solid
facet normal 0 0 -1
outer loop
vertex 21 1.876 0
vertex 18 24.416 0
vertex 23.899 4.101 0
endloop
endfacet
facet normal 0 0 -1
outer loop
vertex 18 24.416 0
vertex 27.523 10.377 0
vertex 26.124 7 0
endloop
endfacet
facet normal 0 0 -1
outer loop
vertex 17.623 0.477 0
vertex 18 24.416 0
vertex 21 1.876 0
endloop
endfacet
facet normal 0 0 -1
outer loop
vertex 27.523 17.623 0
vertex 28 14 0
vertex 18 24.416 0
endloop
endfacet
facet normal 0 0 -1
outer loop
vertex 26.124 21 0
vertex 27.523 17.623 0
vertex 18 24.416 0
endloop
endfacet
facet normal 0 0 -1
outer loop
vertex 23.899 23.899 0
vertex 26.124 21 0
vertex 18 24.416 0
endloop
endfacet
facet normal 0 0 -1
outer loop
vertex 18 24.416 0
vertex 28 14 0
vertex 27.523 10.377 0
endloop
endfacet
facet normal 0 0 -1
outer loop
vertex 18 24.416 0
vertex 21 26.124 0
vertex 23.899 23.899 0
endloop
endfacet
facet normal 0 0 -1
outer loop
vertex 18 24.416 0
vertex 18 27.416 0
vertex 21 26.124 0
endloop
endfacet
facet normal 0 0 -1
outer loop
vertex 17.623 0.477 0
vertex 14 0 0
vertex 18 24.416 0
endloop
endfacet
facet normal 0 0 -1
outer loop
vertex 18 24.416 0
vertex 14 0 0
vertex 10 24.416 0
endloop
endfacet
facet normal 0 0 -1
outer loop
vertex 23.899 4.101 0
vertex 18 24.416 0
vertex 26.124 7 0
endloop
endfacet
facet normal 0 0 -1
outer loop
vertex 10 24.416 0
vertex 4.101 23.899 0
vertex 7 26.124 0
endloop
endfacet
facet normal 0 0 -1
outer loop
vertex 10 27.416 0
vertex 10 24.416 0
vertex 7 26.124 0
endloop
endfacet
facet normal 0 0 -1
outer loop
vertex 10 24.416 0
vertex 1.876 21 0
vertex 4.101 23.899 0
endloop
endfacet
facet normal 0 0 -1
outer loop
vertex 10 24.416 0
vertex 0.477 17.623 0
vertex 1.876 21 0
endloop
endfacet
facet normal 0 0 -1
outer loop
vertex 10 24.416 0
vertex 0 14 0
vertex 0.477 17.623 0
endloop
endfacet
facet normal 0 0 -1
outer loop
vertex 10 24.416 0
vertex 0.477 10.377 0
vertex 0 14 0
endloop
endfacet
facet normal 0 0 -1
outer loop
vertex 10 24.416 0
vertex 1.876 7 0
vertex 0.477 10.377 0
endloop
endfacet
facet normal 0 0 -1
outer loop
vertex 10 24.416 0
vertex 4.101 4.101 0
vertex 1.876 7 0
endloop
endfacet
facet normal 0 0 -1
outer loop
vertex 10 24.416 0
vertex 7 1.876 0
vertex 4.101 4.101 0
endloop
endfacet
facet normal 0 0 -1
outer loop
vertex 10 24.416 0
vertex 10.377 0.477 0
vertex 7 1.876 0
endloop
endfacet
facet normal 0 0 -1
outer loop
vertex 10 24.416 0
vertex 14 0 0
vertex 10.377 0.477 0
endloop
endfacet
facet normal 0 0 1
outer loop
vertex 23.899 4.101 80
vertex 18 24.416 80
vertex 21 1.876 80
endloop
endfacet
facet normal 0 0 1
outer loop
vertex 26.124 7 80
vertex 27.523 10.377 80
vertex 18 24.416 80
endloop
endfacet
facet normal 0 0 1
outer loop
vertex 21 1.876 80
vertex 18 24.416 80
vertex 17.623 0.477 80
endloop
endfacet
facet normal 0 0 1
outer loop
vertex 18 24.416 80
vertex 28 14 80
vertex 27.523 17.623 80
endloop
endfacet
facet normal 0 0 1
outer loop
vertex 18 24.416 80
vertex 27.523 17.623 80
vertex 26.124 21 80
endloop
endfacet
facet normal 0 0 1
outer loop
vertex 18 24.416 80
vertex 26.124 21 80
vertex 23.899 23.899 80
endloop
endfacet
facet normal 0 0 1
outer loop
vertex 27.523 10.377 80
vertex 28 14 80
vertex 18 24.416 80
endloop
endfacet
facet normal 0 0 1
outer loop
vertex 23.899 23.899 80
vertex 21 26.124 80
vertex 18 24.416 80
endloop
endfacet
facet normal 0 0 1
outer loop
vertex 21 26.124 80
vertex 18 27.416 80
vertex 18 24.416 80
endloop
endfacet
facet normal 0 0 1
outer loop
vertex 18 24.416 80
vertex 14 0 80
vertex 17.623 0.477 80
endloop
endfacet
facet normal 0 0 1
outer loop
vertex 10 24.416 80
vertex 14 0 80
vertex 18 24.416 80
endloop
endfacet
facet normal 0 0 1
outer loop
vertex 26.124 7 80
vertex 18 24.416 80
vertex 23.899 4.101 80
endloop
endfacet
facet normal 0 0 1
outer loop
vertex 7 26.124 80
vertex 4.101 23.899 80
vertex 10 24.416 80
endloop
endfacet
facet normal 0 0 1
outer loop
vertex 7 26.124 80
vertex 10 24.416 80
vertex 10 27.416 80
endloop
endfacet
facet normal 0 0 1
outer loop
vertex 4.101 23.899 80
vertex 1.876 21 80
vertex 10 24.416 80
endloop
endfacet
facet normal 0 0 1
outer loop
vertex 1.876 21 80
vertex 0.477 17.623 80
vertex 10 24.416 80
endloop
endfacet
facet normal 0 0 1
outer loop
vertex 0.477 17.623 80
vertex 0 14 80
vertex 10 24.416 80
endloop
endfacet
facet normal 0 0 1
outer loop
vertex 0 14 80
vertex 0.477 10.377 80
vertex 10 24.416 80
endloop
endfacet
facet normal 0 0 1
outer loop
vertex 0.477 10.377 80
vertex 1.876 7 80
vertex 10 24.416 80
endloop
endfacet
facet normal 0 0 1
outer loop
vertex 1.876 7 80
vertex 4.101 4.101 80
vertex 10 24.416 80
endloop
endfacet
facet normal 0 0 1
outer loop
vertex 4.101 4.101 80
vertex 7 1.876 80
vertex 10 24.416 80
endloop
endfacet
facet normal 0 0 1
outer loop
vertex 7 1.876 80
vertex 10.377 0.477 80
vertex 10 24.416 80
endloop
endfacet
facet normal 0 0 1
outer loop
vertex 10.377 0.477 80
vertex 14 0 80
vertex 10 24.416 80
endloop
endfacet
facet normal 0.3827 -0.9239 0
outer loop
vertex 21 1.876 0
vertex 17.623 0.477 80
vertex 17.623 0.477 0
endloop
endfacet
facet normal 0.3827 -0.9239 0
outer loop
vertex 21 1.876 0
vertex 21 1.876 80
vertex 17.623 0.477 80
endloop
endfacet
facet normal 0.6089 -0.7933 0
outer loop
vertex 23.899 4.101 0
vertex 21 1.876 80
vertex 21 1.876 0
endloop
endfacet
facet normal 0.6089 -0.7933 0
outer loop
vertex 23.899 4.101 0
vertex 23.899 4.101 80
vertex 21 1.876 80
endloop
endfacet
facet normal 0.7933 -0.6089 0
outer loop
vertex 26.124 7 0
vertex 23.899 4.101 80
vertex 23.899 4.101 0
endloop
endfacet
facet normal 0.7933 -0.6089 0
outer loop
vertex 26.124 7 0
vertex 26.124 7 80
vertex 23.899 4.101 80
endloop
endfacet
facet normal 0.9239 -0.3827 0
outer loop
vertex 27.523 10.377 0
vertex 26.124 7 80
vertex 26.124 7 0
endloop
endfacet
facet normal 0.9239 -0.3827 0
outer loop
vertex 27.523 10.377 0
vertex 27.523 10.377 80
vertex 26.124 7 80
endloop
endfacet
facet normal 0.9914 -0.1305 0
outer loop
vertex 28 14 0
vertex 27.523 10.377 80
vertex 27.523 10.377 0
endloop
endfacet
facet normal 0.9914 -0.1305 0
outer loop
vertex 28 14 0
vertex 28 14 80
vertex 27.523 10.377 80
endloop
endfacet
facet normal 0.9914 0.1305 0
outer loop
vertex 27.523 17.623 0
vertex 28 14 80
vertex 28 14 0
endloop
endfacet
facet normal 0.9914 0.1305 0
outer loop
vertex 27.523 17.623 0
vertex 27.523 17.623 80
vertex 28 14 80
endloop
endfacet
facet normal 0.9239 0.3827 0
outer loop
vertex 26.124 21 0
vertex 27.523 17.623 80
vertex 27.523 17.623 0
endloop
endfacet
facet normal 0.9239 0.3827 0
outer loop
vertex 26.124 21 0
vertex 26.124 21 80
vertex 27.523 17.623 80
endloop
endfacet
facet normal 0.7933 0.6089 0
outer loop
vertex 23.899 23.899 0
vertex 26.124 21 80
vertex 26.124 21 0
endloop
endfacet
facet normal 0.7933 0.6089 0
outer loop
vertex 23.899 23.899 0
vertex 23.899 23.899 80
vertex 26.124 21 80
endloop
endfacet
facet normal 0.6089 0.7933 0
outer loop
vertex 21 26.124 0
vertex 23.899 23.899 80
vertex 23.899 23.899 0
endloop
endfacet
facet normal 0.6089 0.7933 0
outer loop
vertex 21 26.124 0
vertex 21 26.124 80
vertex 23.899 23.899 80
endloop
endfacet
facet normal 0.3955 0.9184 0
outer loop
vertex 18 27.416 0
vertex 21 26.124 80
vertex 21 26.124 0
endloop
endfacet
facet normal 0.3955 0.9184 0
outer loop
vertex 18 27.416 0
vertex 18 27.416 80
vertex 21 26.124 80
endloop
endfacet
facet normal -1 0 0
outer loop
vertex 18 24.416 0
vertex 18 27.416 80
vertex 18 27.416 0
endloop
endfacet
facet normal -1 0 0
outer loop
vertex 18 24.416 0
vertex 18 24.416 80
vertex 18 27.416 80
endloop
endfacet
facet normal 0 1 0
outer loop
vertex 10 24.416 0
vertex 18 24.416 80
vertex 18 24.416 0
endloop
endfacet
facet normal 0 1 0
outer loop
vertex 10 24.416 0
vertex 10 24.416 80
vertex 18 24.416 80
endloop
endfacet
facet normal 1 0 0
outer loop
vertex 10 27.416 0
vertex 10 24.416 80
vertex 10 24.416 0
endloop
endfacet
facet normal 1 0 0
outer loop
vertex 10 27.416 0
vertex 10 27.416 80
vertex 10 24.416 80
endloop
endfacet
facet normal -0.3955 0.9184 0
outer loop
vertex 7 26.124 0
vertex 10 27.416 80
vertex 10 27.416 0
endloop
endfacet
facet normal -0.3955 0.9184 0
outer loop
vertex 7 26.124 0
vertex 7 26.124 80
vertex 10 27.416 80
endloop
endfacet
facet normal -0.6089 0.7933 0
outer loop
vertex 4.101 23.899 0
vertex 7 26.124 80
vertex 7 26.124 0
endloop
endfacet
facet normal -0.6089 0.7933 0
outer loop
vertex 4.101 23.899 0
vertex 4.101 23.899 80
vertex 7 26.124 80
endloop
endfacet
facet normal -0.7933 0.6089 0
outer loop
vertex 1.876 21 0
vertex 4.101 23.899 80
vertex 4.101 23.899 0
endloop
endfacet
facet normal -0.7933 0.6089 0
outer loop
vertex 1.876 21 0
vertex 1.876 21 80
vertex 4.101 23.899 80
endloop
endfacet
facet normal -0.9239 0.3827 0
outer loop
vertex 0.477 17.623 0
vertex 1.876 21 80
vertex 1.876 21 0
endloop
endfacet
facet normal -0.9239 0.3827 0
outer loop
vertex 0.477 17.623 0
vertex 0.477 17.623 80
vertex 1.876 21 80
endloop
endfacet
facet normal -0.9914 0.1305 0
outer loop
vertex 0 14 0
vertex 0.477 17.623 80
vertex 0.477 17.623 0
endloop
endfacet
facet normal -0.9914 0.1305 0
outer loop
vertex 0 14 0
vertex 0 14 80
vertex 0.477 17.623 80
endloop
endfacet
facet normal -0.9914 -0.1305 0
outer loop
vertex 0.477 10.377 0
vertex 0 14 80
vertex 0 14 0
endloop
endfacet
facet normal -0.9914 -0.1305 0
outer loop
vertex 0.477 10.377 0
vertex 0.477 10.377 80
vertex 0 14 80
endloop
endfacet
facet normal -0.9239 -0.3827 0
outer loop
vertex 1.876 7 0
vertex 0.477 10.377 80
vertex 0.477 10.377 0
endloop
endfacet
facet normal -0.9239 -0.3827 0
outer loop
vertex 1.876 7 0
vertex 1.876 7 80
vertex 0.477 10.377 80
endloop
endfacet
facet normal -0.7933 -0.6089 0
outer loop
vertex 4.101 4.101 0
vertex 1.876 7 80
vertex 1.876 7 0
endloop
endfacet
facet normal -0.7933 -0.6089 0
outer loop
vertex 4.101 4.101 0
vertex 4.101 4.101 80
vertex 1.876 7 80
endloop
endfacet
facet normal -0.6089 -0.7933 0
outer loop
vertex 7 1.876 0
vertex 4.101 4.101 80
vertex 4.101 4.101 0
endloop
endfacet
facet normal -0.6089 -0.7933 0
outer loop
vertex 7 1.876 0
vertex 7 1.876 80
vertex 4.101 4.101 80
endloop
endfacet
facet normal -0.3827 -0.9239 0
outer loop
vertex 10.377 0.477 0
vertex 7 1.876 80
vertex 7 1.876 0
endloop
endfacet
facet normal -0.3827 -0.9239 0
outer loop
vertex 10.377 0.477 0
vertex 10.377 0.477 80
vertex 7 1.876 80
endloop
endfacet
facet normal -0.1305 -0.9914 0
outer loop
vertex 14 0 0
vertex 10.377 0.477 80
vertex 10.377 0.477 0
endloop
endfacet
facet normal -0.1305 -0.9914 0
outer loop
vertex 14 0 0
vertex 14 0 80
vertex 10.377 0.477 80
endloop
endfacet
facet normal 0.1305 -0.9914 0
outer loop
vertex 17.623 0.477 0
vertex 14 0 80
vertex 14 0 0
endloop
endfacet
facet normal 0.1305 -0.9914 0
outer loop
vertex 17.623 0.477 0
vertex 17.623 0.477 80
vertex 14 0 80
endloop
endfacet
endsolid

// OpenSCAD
$fn = 32;

// ----------------------------------------------------------------------
// Keyway shaft: d28 shaft, key 8 x 3 mm
// ----------------------------------------------------------------------

// --- parameters (mm) ---
shaft_r = 14;             // shaft radius
key_w = 8;                // keyway width
key_d = 3;                // keyway depth below the surface line
plate_t = 80;             // shaft length, Z (extrusion height)
fit_tol = 0.02;           // declared fit tolerance (prompt contract)
free_tol = 0.2;           // declared free tolerance (prompt contract)

shaft_d = 2 * shaft_r;  // shaft diameter
circle_step = 15;  // polygon sampling step, degrees

profile = [[7, 26.124], [4.101, 23.899], [1.876, 21], [0.477, 17.623], [0, 14], [0.477, 10.377], [1.876, 7], [4.101, 4.101], [7, 1.876], [10.377, 0.477], [14, 0], [17.623, 0.477], [21, 1.876], [23.899, 4.101], [26.124, 7], [27.523, 10.377], [28, 14], [27.523, 17.623], [26.124, 21], [23.899, 23.899], [21, 26.124], [18, 27.416], [18, 24.416], [10, 24.416], [10, 27.416]];  // primary outline, 25 points, counter clockwise

// --- the one profile operation ---
linear_extrude(height = plate_t) polygon(points = profile);
